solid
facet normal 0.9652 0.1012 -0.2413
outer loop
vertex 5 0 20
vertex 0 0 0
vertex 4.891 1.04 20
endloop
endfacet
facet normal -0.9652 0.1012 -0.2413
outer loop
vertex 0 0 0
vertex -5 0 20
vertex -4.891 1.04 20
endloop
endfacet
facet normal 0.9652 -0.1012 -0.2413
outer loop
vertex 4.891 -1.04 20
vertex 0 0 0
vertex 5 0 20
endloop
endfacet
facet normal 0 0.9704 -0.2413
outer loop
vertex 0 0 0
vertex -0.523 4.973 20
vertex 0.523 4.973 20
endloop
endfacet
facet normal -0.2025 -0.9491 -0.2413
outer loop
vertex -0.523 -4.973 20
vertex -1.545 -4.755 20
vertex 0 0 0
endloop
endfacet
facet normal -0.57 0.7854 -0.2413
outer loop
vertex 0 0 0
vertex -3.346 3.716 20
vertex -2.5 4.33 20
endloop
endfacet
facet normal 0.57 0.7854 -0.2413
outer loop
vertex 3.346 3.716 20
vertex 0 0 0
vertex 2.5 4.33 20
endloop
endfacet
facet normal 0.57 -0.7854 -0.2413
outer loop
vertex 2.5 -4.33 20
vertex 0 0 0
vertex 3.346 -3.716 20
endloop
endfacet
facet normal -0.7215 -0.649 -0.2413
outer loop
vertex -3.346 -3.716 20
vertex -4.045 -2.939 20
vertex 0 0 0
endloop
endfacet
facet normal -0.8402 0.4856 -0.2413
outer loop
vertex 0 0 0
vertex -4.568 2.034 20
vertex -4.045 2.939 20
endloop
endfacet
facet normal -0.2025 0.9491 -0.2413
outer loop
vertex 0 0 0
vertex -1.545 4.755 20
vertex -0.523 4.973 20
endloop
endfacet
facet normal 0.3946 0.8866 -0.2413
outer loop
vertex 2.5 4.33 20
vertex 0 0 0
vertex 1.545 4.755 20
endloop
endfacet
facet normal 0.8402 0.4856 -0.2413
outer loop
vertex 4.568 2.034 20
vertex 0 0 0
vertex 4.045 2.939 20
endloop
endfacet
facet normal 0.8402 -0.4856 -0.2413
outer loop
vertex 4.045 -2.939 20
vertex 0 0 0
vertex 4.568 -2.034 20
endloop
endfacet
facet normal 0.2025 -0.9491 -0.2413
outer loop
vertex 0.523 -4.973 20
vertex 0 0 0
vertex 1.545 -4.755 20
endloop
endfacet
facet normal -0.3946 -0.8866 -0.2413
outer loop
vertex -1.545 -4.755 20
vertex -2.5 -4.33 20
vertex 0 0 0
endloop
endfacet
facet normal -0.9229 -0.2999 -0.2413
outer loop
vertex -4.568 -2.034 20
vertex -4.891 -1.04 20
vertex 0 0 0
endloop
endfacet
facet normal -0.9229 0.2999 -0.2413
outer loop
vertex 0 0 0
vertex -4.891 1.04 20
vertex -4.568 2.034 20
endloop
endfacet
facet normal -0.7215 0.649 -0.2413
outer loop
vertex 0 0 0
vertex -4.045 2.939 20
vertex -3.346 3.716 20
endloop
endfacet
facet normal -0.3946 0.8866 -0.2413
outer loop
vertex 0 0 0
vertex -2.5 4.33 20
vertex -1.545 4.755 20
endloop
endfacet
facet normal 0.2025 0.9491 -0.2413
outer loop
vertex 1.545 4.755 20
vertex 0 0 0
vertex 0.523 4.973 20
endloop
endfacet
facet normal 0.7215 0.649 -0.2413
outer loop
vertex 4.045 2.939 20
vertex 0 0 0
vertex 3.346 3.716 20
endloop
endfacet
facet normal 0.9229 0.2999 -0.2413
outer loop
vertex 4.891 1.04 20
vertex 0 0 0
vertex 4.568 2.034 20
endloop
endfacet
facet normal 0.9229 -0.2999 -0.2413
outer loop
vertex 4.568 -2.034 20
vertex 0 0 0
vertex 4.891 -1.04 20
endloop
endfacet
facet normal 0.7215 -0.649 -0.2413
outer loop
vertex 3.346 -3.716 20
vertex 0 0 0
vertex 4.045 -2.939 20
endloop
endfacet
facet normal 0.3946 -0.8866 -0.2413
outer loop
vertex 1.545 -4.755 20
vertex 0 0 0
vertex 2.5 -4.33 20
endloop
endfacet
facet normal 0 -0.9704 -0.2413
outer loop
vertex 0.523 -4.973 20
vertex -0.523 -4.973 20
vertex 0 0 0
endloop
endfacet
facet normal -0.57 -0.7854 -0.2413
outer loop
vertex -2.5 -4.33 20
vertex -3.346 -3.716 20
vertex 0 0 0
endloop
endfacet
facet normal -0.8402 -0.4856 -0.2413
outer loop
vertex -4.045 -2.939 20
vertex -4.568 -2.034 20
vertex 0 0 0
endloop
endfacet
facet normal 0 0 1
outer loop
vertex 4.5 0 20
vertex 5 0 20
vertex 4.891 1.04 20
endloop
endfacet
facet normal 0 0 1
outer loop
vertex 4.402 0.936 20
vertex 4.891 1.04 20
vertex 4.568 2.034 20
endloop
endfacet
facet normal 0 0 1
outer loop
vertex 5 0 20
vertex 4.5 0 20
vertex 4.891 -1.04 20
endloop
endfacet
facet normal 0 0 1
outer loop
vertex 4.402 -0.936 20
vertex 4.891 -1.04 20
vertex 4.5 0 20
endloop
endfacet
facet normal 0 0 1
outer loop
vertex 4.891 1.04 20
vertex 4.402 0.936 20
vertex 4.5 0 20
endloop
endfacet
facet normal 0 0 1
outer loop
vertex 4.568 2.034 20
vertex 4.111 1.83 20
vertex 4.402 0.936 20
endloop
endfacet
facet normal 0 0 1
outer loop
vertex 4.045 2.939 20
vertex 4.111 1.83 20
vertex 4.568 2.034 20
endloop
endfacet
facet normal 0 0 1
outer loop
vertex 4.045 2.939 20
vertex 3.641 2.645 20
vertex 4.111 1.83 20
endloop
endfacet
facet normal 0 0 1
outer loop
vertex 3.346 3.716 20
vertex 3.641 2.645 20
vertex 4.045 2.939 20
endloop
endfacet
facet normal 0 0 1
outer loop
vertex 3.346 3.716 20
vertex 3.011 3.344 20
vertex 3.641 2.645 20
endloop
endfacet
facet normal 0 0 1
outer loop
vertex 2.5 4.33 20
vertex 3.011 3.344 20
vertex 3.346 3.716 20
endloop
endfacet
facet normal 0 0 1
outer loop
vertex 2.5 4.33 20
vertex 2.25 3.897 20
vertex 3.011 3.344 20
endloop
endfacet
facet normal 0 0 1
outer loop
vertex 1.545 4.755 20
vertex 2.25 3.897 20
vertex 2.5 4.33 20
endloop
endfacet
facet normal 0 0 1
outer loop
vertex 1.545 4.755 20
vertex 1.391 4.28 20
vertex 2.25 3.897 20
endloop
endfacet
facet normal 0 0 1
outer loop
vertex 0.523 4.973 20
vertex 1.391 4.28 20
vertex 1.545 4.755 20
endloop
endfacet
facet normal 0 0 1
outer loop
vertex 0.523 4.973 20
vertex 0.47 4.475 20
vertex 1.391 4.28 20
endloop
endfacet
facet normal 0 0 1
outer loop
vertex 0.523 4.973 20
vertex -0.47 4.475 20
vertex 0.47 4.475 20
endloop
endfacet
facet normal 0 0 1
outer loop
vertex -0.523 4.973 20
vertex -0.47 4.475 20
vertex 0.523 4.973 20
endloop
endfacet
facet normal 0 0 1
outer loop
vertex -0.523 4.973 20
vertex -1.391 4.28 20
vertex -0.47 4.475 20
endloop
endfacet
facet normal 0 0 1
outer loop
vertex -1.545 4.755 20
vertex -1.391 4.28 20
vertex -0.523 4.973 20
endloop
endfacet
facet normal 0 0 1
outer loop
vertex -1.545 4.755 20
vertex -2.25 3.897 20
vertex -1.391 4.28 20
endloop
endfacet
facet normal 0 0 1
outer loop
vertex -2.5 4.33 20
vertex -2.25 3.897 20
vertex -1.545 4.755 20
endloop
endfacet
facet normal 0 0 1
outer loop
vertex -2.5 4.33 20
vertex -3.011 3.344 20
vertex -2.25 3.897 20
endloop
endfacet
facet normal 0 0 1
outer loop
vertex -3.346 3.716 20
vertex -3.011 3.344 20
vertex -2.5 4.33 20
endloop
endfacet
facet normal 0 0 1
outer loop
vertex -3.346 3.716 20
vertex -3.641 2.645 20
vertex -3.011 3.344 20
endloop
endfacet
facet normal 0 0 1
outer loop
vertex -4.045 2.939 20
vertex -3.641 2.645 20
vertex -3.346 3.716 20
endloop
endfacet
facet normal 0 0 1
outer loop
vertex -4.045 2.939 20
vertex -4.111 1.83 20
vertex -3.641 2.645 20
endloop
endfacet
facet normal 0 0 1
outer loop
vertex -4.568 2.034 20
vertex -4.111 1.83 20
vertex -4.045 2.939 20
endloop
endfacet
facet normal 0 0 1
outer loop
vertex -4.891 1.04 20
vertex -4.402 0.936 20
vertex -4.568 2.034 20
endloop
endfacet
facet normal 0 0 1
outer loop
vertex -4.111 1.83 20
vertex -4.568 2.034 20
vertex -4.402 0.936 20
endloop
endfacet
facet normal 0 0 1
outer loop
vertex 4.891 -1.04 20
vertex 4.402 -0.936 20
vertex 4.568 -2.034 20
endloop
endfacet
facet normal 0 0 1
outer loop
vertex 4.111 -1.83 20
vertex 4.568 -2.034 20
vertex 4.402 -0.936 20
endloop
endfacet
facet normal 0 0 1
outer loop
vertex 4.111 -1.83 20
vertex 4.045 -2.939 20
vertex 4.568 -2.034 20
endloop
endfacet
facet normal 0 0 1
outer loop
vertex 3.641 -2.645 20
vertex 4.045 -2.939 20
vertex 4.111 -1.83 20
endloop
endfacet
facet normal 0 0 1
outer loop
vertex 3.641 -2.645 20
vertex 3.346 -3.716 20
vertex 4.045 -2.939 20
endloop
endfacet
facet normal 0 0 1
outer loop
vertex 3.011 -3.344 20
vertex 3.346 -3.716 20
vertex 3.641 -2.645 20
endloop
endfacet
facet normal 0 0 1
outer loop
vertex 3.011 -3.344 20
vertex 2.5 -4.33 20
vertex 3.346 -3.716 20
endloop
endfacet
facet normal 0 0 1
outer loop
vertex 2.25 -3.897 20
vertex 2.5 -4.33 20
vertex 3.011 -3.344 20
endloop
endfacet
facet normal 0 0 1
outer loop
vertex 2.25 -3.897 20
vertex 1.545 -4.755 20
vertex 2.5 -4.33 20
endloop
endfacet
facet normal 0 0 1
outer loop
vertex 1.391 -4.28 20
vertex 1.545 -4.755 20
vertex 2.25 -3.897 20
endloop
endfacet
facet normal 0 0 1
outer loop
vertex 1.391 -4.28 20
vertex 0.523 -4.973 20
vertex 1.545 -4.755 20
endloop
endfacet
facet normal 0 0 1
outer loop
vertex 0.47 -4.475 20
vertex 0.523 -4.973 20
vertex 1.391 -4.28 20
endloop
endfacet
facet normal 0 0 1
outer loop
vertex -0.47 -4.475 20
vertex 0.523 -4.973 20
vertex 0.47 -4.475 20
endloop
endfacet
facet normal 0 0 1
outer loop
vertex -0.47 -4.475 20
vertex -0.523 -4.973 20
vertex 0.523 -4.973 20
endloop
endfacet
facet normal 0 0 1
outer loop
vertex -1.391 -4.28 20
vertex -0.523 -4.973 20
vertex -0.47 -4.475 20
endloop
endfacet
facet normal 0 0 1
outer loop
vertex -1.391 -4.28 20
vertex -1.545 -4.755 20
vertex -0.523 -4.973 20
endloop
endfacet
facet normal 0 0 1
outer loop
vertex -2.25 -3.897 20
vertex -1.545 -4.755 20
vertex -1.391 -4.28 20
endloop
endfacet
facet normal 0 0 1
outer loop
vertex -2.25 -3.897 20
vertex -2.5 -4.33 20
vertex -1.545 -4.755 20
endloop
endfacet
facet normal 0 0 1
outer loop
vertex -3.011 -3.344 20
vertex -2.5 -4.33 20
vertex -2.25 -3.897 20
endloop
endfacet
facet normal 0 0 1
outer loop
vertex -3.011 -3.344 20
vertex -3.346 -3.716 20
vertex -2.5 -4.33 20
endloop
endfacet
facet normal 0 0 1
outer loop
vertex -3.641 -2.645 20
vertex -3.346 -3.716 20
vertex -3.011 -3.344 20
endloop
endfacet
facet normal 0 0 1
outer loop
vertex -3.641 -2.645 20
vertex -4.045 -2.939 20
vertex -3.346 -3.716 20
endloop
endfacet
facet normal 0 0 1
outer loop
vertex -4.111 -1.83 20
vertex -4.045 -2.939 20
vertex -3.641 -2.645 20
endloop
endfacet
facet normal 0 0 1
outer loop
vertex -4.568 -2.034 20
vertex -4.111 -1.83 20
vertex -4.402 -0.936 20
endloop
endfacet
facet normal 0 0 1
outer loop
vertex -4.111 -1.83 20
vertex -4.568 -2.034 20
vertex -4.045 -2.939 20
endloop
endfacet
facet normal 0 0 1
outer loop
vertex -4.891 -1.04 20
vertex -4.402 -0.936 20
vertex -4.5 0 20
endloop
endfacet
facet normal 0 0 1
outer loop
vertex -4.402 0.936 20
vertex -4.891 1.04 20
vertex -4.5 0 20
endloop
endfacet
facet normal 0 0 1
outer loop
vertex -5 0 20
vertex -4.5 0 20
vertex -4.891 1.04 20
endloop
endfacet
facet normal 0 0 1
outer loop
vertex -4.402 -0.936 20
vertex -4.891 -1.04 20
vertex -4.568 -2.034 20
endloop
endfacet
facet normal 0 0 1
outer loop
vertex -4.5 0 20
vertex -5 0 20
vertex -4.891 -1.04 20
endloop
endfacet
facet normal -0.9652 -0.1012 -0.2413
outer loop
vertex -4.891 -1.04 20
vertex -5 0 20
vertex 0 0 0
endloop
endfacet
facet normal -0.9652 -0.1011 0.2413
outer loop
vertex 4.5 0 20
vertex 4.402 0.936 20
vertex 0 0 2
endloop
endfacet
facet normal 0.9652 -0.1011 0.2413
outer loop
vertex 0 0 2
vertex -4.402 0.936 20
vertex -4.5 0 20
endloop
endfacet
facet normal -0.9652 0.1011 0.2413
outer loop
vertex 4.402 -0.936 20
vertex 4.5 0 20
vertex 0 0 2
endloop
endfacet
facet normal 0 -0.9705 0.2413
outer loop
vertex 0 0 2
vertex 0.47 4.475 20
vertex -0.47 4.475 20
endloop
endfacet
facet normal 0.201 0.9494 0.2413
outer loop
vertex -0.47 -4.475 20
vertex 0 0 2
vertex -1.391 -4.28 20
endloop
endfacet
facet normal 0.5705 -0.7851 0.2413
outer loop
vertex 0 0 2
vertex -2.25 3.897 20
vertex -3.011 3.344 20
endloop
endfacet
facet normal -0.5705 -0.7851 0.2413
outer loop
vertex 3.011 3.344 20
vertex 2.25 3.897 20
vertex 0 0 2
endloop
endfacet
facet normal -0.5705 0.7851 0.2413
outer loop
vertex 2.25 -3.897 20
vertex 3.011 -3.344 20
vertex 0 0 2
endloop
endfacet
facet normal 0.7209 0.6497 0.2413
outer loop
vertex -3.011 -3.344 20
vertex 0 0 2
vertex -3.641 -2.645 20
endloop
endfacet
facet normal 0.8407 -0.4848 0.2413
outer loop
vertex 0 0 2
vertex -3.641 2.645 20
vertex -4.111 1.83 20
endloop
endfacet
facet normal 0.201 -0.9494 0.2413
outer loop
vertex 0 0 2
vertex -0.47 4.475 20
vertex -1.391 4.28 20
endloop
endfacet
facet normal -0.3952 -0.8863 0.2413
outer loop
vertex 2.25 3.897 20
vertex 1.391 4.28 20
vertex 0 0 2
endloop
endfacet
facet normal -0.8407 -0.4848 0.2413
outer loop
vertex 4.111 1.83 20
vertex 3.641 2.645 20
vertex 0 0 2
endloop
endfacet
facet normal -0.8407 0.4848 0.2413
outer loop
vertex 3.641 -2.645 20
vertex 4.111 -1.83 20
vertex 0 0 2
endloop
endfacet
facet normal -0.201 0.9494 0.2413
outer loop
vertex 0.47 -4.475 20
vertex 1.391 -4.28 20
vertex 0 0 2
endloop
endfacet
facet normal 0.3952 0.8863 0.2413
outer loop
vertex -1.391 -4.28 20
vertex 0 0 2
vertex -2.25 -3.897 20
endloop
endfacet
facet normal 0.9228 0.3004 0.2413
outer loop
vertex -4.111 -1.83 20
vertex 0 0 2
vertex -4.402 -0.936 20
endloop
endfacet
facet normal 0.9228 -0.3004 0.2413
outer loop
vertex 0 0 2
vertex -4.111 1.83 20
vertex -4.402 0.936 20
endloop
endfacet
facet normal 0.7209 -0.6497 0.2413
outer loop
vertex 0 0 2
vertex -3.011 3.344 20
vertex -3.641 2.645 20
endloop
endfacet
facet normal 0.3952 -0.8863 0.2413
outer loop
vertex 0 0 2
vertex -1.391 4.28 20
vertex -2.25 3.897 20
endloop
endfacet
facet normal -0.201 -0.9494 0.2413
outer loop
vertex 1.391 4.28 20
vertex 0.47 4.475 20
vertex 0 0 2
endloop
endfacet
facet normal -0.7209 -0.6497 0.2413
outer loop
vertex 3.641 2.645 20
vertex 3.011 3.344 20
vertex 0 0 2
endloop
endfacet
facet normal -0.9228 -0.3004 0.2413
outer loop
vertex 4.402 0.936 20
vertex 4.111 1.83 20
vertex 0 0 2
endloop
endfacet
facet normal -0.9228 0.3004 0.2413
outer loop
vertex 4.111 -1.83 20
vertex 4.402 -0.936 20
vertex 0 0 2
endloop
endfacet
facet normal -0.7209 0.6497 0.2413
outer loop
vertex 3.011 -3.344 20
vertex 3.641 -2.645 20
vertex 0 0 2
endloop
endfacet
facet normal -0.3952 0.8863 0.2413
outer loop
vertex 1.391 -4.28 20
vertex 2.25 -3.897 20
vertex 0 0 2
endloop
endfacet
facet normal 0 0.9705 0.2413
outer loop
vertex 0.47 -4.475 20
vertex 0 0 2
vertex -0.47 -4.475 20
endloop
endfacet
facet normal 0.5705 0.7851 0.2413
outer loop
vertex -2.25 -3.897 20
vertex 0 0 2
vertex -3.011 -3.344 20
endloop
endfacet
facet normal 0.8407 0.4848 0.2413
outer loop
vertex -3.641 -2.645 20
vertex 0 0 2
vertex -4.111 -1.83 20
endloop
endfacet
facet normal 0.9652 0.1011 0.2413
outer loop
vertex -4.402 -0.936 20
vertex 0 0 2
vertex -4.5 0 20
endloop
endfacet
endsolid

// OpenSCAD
$fn=30;
$h=20;
$d=10;
difference() {
	cylinder(h=$h, d1=0, d2=$d);
	translate([0, 0, 2])
		cylinder(h=$h, d1=0, d2=$d);
}
